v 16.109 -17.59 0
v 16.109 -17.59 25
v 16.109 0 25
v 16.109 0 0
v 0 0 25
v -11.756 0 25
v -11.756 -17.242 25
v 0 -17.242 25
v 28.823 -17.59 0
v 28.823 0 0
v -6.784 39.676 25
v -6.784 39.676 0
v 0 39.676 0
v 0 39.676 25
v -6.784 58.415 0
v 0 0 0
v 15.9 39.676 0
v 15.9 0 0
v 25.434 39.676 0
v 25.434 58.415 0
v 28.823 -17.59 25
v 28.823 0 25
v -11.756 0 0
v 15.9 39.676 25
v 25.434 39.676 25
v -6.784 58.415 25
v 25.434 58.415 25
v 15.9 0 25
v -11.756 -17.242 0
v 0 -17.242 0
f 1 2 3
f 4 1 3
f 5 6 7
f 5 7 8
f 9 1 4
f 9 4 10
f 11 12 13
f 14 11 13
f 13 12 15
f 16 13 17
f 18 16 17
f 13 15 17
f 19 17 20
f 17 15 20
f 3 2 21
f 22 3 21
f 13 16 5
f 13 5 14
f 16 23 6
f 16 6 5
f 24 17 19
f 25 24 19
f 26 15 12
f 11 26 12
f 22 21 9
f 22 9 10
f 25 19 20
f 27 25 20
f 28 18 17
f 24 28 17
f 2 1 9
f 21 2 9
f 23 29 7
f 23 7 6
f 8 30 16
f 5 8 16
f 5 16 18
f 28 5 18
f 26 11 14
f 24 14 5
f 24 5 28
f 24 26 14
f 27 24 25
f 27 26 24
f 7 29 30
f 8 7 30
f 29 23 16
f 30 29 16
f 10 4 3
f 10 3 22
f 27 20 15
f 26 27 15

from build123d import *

# Parameters (mm, degrees)
F0_W     = 11.7555651814
F0_H     = 17.2415003181
F1_DEPTH = 25
F0_W_2   = 15.900246799
F0_H_2   = 39.6757572889
F0_H_3   = 0.6575286388
F0_W_3   = 12.7134267241
F0_H_4   = 17.5898130983


with BuildPart() as f1:
    # F0 (on Top) → F1 (new body)
    with BuildSketch(Plane.XY):
        with Locations((-5.8777825907, -8.620750159)):
            Rectangle(F0_W, F0_H)
    extrude(amount=F1_DEPTH)


with BuildPart() as f1b:
    # F0 (on Top) → F1, piece 2 (new body)
    with BuildSketch(Plane.XY):
        with Locations((7.9501233995, 19.8378786445)):
            Rectangle(F0_W_2, F0_H_2)
        Polygon((-6.7844577134, 39.6757572889), (0, 39.6757572889), (0, 40.3332859278), (15.900246799, 40.3332859278), (15.900246799, 39.6757572889), (25.4343990237, 39.6757572889), (25.4343990237, 58.4152974188), (-6.7844577134, 58.4152974188), align=None)
        with Locations((7.9501233995, 40.0045216084)):
            Rectangle(F0_W_2, F0_H_3)
    extrude(amount=F1_DEPTH)


with BuildPart() as f1c:
    # F0 (on Top) → F1, piece 3 (new body)
    with BuildSketch(Plane.XY):
        with Locations((22.4662022665, -8.7949065492)):
            Rectangle(F0_W_3, F0_H_4)
    extrude(amount=F1_DEPTH)


solid = Compound([f1.part, f1b.part, f1c.part])
